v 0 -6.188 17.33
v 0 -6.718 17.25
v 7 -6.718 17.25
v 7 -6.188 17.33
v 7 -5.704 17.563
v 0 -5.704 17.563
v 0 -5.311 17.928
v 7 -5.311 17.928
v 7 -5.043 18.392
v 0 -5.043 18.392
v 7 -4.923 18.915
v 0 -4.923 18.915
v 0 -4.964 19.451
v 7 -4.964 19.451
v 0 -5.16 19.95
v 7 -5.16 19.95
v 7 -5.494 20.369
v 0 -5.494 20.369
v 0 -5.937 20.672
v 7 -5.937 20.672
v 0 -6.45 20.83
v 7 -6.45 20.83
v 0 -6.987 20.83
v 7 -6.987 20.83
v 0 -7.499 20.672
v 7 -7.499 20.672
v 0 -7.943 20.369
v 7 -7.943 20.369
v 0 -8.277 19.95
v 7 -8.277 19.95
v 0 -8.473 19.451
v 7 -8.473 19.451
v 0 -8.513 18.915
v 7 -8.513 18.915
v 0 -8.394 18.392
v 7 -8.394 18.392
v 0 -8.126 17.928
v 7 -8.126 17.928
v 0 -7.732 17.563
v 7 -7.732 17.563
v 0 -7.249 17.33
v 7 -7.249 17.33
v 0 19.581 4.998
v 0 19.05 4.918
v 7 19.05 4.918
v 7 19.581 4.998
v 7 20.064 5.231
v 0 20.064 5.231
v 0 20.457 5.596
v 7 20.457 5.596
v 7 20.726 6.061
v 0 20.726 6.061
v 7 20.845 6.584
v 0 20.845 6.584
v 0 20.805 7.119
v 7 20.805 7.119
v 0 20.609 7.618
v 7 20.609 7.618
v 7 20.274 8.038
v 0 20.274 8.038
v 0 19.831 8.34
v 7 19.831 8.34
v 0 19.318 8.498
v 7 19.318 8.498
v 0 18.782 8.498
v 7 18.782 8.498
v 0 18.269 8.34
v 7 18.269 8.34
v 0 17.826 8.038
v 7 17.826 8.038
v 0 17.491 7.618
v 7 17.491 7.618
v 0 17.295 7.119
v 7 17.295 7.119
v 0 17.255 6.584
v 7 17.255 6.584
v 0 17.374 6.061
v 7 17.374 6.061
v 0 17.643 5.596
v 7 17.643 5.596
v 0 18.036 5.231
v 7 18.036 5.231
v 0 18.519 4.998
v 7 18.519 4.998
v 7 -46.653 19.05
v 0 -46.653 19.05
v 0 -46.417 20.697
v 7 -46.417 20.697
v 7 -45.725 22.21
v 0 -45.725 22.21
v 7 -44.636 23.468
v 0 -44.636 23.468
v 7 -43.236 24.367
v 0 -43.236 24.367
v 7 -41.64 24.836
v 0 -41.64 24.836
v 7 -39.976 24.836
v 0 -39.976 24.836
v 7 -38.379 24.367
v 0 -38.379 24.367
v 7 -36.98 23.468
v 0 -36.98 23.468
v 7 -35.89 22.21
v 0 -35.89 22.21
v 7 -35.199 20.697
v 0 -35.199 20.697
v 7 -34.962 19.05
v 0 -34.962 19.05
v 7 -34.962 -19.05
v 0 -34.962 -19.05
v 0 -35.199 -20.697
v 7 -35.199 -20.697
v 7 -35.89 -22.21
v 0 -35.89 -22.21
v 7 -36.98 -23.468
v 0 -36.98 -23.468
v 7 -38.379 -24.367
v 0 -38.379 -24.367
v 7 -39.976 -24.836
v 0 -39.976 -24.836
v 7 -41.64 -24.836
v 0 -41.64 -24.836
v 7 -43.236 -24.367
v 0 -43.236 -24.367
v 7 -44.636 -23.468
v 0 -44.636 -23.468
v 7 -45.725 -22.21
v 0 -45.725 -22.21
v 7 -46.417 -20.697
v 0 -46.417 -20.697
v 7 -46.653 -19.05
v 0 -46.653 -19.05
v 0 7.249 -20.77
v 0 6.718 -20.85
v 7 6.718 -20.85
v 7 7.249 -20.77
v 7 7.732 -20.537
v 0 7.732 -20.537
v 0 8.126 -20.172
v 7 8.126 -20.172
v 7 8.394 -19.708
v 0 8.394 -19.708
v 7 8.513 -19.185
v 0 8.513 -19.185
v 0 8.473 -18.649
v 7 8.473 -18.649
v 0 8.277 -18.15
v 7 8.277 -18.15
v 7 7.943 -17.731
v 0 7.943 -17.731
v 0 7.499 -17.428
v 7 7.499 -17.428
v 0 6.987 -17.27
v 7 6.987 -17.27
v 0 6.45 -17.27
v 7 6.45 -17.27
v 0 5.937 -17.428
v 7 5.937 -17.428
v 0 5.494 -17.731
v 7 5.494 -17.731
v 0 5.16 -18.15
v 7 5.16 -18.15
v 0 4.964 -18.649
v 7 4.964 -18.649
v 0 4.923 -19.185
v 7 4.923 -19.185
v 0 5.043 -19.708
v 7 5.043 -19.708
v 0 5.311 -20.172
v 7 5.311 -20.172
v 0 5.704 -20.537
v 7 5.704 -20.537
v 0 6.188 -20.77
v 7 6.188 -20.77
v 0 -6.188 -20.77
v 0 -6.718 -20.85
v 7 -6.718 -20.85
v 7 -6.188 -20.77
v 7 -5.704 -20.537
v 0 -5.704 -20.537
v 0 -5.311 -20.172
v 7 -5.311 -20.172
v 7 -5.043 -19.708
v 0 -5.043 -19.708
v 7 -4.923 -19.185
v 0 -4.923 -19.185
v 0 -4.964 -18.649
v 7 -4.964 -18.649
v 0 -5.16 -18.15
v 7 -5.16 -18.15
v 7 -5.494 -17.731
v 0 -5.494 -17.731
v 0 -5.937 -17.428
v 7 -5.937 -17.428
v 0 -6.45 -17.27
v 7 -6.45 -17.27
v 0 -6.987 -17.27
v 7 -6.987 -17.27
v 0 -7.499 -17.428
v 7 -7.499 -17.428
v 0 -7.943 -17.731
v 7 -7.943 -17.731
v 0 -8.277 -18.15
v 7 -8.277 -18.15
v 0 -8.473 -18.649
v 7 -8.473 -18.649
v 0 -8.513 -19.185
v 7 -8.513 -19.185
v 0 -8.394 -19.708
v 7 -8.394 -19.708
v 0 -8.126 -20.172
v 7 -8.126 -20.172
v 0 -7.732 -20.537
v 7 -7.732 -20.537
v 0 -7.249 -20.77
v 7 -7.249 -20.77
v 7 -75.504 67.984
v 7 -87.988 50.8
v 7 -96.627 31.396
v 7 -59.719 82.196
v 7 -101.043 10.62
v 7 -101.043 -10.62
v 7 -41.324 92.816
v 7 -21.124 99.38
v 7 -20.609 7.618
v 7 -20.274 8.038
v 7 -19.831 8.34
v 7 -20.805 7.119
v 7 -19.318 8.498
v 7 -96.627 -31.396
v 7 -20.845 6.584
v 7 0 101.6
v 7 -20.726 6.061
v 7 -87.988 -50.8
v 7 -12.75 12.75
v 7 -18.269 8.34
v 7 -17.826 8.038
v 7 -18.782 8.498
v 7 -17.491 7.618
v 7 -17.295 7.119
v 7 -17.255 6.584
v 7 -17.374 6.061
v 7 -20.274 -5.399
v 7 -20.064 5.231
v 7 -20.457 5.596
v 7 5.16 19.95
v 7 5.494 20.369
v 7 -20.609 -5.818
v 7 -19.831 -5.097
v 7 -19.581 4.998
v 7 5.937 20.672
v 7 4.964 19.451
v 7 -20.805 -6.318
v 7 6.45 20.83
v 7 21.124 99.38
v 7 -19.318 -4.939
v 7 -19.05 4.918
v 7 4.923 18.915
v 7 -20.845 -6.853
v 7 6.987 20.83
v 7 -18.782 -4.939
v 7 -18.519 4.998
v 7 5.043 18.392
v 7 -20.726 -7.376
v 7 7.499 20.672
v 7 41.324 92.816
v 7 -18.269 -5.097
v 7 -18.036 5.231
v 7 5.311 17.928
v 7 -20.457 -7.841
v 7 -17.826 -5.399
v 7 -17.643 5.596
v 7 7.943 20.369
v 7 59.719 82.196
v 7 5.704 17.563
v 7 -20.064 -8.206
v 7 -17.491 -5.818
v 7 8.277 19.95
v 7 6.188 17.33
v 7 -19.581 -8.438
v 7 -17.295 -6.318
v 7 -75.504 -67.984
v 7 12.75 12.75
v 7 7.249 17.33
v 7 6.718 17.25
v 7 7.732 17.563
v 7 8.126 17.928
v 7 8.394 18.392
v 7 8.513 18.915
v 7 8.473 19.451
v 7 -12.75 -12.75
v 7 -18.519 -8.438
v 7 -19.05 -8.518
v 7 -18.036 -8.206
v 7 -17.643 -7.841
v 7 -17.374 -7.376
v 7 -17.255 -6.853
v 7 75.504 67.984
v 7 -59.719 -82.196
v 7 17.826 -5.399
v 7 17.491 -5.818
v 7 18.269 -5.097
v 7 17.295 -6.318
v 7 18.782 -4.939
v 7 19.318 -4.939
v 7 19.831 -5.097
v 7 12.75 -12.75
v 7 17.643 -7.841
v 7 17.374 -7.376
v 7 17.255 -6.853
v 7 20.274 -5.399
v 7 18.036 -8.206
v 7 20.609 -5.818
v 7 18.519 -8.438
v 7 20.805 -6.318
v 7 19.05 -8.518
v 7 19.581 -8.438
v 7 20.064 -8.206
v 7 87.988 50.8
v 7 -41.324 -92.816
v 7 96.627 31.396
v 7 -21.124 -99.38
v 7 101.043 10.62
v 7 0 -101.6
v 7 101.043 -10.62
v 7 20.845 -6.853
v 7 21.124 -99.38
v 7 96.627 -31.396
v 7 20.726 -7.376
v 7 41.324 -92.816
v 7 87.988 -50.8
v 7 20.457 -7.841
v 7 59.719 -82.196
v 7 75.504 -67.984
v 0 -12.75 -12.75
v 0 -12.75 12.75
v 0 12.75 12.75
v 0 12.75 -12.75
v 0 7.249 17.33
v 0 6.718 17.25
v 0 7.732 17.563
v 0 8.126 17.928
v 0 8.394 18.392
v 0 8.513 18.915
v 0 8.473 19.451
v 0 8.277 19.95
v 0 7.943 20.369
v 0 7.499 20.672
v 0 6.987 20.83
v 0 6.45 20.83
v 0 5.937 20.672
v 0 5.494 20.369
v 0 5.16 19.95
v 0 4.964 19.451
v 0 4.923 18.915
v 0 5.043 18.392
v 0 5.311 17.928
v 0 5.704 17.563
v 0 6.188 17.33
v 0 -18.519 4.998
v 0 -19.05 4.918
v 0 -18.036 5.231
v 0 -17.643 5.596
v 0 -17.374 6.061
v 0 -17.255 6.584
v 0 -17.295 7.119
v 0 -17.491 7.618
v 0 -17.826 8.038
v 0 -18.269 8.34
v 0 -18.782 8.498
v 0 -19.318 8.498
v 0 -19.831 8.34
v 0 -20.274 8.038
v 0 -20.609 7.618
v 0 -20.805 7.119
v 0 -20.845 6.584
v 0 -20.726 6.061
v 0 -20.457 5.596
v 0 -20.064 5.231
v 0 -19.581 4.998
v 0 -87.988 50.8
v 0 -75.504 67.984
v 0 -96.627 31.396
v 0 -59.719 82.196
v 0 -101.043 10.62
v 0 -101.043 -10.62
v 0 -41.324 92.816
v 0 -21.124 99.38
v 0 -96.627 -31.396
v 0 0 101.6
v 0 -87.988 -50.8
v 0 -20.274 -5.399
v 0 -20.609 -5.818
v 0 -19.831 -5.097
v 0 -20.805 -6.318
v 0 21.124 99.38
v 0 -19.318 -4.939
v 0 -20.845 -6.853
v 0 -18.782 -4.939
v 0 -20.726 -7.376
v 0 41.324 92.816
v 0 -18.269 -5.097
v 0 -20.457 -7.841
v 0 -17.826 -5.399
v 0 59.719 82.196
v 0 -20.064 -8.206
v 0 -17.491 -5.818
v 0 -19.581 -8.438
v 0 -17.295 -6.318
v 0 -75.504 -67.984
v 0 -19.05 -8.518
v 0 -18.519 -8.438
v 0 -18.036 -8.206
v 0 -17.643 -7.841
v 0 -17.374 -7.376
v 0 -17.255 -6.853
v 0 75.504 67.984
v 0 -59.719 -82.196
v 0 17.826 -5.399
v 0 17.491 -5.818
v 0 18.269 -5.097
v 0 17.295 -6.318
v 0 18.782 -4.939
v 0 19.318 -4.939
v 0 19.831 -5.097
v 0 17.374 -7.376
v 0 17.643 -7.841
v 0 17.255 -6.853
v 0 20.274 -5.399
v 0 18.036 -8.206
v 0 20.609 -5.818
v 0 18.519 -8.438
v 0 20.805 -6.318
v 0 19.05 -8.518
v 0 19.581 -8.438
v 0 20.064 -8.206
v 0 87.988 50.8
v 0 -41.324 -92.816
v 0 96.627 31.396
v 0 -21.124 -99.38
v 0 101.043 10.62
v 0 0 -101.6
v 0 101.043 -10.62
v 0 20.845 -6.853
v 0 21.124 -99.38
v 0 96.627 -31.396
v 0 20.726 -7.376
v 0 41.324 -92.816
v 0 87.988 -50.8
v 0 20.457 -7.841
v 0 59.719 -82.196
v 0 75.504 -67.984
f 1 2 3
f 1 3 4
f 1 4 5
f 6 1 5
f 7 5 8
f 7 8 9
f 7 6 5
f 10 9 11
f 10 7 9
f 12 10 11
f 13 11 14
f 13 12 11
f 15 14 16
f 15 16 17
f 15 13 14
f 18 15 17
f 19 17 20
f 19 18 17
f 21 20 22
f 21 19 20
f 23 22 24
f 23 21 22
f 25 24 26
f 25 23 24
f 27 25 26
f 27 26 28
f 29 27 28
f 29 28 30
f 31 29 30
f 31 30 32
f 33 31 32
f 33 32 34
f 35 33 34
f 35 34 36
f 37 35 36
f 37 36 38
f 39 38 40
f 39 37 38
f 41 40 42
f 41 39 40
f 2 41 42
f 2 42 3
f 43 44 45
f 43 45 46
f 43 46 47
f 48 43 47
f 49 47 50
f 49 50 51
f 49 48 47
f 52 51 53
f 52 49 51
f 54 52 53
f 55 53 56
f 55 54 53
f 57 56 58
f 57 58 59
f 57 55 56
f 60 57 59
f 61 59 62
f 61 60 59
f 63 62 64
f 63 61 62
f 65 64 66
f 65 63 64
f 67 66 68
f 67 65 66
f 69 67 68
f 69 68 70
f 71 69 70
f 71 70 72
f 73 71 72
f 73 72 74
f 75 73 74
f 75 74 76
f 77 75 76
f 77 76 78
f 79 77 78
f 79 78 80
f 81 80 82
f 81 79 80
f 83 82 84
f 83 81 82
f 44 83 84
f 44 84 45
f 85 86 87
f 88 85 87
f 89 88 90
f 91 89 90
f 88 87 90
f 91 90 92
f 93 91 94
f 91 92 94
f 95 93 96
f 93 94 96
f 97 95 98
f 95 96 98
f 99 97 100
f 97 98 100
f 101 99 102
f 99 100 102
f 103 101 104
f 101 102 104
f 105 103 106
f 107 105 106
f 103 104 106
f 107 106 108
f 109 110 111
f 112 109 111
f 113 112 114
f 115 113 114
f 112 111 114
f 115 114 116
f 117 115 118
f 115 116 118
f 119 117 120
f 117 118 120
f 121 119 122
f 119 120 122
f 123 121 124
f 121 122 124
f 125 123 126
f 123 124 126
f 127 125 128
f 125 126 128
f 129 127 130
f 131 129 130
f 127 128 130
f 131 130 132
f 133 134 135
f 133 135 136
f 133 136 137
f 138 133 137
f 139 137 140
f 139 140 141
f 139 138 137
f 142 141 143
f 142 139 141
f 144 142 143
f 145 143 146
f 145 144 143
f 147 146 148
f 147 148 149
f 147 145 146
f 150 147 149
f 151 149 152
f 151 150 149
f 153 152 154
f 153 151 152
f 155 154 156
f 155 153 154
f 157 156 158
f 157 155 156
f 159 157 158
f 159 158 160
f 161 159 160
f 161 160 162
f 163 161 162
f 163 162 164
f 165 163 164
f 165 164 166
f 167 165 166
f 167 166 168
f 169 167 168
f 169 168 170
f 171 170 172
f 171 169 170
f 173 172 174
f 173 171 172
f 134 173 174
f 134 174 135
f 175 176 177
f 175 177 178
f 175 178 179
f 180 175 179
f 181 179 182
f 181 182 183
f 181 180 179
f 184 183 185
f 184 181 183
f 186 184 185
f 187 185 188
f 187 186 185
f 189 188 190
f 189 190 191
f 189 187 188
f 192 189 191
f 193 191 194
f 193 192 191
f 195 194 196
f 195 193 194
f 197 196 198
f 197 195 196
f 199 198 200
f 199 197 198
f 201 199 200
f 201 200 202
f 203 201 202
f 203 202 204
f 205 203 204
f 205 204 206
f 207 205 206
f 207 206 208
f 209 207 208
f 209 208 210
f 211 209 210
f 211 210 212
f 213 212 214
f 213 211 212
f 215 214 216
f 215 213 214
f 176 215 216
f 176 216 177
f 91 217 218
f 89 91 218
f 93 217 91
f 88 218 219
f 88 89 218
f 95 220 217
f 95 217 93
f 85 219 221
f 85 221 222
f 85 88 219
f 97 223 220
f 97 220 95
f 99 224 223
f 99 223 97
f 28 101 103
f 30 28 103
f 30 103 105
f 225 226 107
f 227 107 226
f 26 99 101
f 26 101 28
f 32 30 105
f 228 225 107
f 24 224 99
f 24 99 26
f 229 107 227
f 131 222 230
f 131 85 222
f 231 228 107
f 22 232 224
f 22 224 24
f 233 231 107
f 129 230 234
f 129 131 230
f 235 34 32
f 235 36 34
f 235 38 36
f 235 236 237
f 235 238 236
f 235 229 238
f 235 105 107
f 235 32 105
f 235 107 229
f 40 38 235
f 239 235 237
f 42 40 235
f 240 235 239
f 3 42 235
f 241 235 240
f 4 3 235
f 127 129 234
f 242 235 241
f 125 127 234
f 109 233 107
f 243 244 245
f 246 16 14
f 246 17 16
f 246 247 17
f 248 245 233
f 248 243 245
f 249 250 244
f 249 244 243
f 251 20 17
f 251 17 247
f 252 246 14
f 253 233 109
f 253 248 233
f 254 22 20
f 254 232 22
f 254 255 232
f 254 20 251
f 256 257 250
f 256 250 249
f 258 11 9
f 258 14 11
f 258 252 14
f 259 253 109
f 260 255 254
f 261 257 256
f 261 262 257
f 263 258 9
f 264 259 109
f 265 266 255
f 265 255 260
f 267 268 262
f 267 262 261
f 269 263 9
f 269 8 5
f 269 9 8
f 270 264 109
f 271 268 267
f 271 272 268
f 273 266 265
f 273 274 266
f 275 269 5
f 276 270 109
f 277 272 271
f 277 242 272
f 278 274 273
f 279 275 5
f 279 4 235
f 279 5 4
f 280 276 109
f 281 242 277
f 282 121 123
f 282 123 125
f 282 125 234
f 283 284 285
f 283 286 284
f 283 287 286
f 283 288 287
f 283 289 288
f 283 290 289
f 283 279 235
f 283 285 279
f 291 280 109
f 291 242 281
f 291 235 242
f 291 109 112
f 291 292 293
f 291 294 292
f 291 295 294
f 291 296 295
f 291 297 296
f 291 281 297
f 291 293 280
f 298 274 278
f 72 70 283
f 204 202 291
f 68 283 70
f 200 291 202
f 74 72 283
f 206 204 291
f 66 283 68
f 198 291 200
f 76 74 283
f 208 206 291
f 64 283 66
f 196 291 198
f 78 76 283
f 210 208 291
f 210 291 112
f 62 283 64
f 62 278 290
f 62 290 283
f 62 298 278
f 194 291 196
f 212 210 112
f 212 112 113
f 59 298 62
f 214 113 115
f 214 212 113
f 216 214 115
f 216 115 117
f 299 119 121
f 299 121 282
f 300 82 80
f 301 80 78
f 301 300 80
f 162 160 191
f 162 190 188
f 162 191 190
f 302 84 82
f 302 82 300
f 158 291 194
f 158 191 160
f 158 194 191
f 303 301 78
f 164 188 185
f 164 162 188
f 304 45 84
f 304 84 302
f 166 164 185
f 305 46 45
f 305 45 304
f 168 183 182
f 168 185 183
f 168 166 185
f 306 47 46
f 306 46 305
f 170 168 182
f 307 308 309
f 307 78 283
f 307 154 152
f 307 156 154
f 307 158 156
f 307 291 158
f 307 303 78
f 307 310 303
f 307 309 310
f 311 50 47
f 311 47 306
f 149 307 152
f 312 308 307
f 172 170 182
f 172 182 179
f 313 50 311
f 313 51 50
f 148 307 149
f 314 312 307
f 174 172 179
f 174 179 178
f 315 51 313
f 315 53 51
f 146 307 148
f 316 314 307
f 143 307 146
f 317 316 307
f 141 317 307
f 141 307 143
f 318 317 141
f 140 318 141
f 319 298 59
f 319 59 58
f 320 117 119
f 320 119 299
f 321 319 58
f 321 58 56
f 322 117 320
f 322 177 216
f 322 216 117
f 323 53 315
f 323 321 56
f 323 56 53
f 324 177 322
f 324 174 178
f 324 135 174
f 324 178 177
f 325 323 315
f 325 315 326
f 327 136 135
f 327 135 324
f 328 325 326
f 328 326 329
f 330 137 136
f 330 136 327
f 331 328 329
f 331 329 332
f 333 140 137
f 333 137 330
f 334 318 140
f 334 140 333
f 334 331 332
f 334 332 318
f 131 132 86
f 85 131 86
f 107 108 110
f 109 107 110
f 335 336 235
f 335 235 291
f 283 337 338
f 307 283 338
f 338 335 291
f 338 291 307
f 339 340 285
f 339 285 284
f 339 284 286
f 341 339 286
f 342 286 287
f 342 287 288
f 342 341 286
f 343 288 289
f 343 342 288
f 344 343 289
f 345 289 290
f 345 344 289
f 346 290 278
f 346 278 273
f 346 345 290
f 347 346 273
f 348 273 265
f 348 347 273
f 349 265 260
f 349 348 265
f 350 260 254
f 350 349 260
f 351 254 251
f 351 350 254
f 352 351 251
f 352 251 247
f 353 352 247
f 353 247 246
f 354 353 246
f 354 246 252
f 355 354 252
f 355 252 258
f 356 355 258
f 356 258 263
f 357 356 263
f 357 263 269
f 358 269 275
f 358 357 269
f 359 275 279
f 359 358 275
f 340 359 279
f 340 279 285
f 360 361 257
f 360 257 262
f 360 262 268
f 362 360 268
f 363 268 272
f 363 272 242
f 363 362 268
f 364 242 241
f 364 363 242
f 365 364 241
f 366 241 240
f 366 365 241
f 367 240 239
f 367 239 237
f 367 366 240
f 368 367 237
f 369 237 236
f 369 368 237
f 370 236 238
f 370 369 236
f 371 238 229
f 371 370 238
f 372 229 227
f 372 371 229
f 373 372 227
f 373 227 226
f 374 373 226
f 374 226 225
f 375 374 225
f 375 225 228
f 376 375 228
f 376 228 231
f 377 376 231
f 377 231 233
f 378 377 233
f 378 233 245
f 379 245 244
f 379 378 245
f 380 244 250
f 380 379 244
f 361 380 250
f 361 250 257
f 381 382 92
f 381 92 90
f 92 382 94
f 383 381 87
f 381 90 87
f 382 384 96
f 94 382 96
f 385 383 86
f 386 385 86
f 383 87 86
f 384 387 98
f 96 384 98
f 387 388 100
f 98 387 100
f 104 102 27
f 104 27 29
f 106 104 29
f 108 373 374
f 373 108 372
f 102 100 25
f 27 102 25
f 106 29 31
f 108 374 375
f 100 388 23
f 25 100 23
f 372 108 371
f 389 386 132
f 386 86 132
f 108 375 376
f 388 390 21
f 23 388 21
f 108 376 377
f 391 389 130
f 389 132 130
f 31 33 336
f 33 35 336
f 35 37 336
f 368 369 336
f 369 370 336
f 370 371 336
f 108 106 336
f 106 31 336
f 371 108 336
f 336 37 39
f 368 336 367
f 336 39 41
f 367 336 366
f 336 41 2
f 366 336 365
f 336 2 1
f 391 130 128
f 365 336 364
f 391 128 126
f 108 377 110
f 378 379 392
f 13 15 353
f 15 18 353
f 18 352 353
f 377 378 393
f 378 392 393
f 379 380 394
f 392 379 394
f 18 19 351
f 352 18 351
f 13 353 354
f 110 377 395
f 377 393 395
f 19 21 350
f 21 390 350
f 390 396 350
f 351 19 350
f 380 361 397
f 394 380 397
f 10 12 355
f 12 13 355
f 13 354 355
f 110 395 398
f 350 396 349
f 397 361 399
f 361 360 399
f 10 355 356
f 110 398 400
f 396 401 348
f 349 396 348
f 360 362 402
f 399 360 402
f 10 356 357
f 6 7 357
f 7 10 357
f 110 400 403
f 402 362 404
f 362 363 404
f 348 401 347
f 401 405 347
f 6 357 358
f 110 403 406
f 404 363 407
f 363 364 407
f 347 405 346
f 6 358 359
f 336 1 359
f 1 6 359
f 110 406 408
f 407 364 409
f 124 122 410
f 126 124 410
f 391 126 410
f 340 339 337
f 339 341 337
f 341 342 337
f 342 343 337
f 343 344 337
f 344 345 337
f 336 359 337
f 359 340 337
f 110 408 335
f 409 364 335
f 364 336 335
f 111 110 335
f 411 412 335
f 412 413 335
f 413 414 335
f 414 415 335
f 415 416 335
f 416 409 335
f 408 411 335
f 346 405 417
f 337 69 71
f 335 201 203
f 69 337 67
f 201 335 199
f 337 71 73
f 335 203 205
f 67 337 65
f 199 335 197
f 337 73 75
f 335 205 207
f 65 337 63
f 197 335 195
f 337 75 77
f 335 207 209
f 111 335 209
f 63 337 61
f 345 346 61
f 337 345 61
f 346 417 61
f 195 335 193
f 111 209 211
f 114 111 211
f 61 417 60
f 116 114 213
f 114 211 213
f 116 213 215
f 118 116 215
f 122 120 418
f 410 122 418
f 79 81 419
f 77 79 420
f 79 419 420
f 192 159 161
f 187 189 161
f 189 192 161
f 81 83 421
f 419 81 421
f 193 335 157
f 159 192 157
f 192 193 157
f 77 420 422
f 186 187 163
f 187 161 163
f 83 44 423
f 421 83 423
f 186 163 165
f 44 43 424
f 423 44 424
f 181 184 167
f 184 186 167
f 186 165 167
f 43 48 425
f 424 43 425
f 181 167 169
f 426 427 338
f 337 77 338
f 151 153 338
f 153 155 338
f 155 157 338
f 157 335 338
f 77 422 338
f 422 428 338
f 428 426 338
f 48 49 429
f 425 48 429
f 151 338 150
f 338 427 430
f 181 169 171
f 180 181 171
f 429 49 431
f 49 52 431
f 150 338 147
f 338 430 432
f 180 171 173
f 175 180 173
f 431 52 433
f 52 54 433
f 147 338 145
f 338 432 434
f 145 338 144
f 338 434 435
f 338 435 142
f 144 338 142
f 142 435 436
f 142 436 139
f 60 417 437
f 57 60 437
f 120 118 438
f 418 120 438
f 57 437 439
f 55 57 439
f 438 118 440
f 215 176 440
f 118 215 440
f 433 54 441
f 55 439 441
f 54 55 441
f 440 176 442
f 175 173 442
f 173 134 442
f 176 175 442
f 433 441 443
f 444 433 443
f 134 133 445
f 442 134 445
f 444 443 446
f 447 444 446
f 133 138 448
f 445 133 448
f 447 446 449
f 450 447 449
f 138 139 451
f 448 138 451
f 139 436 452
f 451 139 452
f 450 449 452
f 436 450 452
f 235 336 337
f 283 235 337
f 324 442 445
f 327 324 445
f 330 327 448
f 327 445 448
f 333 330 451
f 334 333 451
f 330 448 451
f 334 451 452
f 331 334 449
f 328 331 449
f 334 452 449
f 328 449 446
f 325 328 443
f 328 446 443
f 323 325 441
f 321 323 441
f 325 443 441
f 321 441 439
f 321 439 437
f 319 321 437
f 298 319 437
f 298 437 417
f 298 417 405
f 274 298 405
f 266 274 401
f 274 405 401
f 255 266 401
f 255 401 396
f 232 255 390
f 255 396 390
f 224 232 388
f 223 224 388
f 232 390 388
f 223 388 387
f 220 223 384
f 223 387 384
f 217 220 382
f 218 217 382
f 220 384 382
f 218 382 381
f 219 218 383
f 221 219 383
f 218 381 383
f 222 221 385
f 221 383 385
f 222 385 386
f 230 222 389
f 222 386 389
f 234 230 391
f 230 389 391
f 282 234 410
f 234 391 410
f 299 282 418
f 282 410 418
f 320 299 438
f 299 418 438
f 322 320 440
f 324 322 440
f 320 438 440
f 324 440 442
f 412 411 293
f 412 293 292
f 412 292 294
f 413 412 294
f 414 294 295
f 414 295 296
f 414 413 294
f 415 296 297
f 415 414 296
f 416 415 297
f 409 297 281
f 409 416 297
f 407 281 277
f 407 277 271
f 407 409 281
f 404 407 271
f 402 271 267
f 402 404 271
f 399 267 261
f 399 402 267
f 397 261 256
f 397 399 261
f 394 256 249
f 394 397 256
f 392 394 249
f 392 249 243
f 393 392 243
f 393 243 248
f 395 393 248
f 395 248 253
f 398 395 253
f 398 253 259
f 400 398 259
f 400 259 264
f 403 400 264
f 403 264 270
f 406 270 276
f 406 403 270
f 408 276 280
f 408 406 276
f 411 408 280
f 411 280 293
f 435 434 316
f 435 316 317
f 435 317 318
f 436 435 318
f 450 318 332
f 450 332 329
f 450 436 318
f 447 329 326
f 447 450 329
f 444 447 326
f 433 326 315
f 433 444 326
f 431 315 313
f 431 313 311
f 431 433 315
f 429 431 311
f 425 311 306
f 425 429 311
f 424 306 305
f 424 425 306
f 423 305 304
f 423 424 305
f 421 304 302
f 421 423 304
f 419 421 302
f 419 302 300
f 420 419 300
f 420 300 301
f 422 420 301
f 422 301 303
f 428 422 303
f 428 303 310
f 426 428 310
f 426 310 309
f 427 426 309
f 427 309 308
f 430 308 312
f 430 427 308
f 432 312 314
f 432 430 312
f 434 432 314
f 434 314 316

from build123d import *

# Parameters (mm, degrees)
SKETCH1_R           = 101.6
SKETCH1_R_2         = 1.8
SKETCH1_W           = 25.5
SKETCH1_H           = 25.5
BOSS_EXTRUDE2_DEPTH = 7


with BuildPart() as part:
    # Sketch1 → Boss-Extrude2 (new body)
    with BuildSketch(Plane(origin=(0, 0, 0), x_dir=(0, 0, -1), z_dir=(1, 0, 0))):
        Circle(SKETCH1_R)
        with Locations((19.05, 6.718444761)):
            Circle(SKETCH1_R_2, mode=Mode.SUBTRACT)
        with Locations((19.05, -6.718444761)):
            Circle(SKETCH1_R_2, mode=Mode.SUBTRACT)
        with Locations((-6.718444761, -19.05)):
            Circle(SKETCH1_R_2, mode=Mode.SUBTRACT)
        with Locations((6.718444761, -19.05)):
            Circle(SKETCH1_R_2, mode=Mode.SUBTRACT)
        with Locations((-19.05, 6.718444761)):
            Circle(SKETCH1_R_2, mode=Mode.SUBTRACT)
        with Locations((-19.05, -6.718444761)):
            Circle(SKETCH1_R_2, mode=Mode.SUBTRACT)
        with Locations((6.718444761, 19.05)):
            Circle(SKETCH1_R_2, mode=Mode.SUBTRACT)
        with Locations((-6.718444761, 19.05)):
            Circle(SKETCH1_R_2, mode=Mode.SUBTRACT)
        Rectangle(SKETCH1_W, SKETCH1_H, mode=Mode.SUBTRACT)
        with BuildLine():
            Line((-19.05, -34.96193786), (19.05, -34.96193786))
            ThreePointArc((19.05, -34.96193786), (24.895725944, -40.807663805), (19.05, -46.653389749))
            Line((19.05, -46.653389749), (-19.05, -46.653389749))
            ThreePointArc((-19.05, -46.653389749), (-24.895725944, -40.807663805), (-19.05, -34.96193786))
        make_face(mode=Mode.SUBTRACT)
    extrude(amount=BOSS_EXTRUDE2_DEPTH)


solid = part.part
